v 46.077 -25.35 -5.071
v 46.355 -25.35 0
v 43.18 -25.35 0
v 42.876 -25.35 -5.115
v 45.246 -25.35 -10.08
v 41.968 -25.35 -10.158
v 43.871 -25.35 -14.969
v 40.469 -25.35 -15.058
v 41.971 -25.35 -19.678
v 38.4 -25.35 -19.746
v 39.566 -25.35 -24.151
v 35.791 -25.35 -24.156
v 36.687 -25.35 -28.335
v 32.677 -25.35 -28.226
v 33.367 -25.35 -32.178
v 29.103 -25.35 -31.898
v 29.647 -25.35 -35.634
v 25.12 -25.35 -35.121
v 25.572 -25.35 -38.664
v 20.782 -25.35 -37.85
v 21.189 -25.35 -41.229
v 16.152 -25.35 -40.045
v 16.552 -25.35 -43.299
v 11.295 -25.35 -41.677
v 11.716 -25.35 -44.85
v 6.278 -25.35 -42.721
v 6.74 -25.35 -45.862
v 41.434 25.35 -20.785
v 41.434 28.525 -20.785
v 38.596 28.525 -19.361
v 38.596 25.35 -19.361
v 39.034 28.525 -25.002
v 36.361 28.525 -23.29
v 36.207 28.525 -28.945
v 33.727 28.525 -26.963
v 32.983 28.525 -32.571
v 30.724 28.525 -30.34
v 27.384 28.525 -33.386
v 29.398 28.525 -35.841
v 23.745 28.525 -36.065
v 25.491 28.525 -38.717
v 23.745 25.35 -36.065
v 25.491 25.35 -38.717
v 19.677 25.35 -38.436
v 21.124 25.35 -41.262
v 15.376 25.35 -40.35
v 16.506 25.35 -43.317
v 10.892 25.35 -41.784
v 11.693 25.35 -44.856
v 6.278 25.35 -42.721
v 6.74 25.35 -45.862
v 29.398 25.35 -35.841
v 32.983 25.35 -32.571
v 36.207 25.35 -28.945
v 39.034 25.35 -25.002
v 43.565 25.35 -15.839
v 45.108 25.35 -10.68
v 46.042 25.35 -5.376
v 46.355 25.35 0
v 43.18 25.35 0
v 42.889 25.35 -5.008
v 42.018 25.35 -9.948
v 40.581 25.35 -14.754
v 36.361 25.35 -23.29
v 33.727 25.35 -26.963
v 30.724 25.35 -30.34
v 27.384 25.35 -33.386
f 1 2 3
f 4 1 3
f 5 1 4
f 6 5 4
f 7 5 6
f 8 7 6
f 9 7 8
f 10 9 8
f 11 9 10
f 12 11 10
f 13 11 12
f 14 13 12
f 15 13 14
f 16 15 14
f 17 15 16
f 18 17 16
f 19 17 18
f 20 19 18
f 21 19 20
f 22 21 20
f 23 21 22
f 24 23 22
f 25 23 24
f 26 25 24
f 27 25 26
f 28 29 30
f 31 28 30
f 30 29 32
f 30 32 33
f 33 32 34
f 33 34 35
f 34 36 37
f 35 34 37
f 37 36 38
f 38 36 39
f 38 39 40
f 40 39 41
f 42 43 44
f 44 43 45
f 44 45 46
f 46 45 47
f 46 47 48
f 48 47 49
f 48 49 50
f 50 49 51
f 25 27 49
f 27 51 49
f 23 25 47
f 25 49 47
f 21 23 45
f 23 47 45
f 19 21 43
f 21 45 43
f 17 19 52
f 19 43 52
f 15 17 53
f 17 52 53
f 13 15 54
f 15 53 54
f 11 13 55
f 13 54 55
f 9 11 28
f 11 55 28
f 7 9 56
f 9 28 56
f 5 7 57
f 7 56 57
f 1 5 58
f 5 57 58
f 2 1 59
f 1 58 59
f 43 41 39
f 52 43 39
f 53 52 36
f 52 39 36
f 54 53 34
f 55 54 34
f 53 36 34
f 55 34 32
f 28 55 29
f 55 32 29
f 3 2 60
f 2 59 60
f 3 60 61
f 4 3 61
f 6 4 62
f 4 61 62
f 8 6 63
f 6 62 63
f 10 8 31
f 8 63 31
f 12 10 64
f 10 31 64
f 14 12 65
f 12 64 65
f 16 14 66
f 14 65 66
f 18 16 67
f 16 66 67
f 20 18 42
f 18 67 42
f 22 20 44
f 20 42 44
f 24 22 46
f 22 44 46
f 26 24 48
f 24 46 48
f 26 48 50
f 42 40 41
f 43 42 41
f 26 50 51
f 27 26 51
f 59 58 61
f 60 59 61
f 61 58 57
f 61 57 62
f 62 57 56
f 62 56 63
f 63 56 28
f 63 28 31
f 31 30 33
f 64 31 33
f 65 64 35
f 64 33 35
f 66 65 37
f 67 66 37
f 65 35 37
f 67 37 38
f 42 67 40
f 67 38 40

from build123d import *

# Parameters (mm, degrees)
BOSS_EXTRUDE1_DEPTH = 25.3500001
BOSS_EXTRUDE2_START = 3.175
BOSS_EXTRUDE2_DEPTH = 3.175


with BuildPart() as part:
    # Sketch1 → Boss-Extrude1 (new, symmetric)
    with BuildSketch(Plane(origin=(0, 0, 0), x_dir=(1, 0, 0), z_dir=(0, 1, 0))):
        with BuildLine():
            Line((6.278041701, 42.721172648), (6.739662414, 45.862435342))
            ThreePointArc((6.739662414, 45.862435342), (35.079930703, 30.30155915), (46.355, 0))
            Line((46.355, 0), (43.18, 0))
            ThreePointArc((43.18, 0), (32.677195723, 28.226109893), (6.278041701, 42.721172648))
        make_face()
    extrude(amount=BOSS_EXTRUDE1_DEPTH, both=True)

    # Sketch4 → Boss-Extrude2 (add)
    with BuildSketch(Plane(origin=(0, 25.3500001, 0), x_dir=(1, 0, 0), z_dir=(0, 1, 0)).offset(BOSS_EXTRUDE2_START)):
        with BuildLine():
            Line((41.434019217, 20.784803982), (38.596072695, 19.361187271))
            ThreePointArc((38.596072695, 19.361187271), (32.269899408, 28.690869492), (23.744585805, 36.065316371))
            Line((23.744585805, 36.065316371), (25.490511231, 38.717177869))
            ThreePointArc((25.490511231, 38.717177869), (34.642686129, 30.800492249), (41.434019217, 20.784803982))
        make_face()
    extrude(amount=-BOSS_EXTRUDE2_DEPTH)


solid = part.part
